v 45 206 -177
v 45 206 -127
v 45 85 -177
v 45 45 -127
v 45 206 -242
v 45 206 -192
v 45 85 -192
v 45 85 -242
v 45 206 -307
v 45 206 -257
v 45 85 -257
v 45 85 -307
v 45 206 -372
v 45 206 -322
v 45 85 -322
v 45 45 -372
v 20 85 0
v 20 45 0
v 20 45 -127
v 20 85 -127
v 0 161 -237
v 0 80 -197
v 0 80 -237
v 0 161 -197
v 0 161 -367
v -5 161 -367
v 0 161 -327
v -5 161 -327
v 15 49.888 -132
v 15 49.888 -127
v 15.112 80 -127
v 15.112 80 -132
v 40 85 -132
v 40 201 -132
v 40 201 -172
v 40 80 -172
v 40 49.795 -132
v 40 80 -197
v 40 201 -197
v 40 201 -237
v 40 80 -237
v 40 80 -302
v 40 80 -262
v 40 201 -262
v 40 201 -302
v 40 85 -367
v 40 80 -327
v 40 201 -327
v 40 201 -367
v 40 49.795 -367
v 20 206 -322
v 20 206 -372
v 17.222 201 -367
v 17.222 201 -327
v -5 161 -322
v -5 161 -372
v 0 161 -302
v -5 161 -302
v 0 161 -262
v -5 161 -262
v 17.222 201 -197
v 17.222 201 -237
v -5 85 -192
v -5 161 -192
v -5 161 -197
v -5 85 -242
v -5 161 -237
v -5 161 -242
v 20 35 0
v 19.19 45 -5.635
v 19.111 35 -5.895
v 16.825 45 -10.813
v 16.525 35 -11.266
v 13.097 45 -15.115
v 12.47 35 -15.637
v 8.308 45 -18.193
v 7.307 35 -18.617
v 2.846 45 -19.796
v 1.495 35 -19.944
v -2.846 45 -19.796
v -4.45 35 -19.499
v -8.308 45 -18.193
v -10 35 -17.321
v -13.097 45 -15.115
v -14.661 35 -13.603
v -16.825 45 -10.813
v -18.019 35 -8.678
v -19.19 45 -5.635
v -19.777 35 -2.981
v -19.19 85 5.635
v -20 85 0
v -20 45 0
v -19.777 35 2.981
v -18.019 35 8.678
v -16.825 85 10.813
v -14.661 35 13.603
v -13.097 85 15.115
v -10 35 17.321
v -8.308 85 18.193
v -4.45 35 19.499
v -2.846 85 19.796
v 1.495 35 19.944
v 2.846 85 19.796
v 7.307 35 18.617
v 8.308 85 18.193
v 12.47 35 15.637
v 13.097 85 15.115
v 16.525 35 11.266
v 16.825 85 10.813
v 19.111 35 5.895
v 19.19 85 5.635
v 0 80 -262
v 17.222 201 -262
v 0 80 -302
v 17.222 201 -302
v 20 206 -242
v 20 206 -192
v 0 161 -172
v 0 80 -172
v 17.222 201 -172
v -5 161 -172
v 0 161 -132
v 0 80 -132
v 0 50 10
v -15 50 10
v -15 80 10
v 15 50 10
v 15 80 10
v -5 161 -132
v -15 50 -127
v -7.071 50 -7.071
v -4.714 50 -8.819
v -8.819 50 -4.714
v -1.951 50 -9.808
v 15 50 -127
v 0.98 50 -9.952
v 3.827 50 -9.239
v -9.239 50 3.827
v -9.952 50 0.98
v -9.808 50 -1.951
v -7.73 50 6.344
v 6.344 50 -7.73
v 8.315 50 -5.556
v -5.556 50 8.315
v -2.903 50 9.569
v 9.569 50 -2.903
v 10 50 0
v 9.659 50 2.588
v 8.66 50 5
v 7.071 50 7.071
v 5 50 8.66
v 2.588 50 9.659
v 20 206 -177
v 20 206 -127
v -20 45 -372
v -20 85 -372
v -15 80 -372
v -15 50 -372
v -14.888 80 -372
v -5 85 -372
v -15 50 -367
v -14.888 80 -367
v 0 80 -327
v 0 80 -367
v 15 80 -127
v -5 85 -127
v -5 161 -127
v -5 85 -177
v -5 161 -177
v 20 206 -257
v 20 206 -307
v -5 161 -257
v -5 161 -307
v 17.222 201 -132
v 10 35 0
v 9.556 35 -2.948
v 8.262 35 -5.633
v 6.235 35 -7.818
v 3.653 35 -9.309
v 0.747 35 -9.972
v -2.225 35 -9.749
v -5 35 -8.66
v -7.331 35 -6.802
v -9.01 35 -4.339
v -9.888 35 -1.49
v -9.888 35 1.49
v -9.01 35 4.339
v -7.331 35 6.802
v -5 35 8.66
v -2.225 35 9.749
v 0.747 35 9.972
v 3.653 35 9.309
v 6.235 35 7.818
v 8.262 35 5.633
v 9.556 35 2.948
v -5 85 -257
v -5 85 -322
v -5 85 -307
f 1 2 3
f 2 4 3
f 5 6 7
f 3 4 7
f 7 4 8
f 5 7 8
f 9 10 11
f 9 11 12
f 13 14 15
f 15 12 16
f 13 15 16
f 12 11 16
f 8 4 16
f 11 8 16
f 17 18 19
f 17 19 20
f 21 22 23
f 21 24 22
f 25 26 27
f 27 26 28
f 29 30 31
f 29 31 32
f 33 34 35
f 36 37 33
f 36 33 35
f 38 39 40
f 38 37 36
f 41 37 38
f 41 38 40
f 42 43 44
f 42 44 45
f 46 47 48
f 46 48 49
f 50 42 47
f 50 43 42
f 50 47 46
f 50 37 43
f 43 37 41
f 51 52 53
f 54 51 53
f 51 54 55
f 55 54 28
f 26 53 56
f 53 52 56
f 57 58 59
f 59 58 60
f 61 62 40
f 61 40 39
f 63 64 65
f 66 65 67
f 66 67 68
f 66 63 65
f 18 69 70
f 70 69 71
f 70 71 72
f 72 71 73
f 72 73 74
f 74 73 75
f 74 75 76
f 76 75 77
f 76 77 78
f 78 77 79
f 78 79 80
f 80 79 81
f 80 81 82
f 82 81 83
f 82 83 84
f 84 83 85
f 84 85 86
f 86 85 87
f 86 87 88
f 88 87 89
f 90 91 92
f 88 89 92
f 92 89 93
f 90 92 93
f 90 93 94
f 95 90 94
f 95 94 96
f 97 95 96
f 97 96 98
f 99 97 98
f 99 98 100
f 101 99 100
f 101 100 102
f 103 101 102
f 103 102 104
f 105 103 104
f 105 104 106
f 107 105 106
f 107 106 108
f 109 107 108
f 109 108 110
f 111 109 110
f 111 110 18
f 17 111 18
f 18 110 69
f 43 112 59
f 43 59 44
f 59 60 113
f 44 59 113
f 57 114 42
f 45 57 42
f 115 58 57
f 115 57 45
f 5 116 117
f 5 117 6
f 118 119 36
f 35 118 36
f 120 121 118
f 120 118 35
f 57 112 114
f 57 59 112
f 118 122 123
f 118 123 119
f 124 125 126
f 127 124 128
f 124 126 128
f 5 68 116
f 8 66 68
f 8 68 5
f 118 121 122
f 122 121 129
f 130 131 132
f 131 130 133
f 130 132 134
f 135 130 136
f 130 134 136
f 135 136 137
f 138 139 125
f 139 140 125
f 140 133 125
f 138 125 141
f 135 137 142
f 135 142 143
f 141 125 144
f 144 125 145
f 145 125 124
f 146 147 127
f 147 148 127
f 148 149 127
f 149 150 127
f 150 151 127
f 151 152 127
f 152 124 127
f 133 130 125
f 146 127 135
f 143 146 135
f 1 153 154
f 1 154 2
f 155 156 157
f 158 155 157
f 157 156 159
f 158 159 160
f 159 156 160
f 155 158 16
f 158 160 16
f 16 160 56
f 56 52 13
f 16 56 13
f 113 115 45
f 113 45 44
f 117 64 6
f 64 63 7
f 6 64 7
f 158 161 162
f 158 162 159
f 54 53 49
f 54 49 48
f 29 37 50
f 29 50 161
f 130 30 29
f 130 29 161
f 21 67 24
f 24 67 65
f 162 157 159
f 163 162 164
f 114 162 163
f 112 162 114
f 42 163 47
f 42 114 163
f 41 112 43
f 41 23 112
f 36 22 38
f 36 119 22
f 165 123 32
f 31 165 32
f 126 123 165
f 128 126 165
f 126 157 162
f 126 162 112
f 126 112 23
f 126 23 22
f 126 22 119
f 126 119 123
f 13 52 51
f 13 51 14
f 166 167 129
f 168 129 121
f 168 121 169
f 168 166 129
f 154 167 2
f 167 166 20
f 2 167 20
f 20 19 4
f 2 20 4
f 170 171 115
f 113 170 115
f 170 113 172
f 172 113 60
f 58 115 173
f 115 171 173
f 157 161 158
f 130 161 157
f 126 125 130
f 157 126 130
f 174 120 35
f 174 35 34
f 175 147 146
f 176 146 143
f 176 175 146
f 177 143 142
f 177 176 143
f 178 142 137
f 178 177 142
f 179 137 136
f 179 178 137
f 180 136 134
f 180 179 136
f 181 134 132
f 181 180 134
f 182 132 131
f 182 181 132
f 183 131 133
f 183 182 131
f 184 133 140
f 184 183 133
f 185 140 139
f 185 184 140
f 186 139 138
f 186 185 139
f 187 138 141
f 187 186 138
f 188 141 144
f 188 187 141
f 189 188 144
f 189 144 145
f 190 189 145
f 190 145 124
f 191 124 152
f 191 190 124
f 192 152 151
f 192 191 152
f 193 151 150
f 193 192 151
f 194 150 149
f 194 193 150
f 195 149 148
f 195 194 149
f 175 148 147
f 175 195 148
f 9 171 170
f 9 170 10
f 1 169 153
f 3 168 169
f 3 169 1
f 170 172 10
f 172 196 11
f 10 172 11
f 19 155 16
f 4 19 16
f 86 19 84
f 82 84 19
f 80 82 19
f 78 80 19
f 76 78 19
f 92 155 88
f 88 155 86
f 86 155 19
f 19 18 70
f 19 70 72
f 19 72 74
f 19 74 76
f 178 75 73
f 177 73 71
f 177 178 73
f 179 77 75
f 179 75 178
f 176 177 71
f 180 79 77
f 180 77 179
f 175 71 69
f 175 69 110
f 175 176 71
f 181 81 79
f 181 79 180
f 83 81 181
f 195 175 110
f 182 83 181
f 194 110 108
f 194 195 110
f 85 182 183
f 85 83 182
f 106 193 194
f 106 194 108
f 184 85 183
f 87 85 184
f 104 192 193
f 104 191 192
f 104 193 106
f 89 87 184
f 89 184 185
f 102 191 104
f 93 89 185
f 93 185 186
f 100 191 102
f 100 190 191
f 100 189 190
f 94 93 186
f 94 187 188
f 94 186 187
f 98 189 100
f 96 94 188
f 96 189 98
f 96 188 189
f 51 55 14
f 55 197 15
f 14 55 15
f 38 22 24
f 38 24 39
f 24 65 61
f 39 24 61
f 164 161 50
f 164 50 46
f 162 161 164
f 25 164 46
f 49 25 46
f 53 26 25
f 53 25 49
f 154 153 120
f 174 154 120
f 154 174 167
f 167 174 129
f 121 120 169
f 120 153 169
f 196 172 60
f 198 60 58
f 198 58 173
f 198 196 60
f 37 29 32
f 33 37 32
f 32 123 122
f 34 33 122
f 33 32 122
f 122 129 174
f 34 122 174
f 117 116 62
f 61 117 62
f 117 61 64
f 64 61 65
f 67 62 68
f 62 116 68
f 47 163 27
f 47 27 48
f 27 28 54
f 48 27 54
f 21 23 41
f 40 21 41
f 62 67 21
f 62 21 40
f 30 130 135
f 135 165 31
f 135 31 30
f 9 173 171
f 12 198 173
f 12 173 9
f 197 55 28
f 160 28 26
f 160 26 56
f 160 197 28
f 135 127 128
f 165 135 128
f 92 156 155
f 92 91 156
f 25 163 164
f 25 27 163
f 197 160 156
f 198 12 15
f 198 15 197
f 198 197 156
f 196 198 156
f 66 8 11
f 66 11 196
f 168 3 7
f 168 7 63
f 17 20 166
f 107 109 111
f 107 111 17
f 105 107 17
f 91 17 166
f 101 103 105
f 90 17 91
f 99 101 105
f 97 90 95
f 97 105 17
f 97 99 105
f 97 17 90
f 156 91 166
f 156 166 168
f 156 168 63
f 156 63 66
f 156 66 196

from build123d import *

# Parameters (mm, degrees)
SKETCH2_R               = 20
SKETCH2_R_2             = 10
BOSS_EXTRUDE1_DEPTH     = 80
SKETCH3_R               = 20
BOSS_EXTRUDE2_DEPTH     = 5
SKETCH4_W               = 30
SKETCH4_H               = 30
CUT_EXTRUDE1_DEPTH      = 50
SKETCH4_4_W             = 40
SKETCH4_4_H             = 40
SKETCH4_4_W_2           = 30
SKETCH4_4_H_2           = 30
BOSS_EXTRUDE3_DEPTH     = 127
SKETCH4_5_W             = 30
SKETCH4_5_H             = 30
CUT_EXTRUDE2_DEPTH      = 10
SKETCH5_R               = 10
CUT_EXTRUDE3_DEPTH      = 50
BOSS_EXTRUDE4_DEPTH     = 245
SKETCH7_W               = 25
SKETCH7_H               = 5
SKETCH7_W_2             = 55.000380238
BOSS_EXTRUDE5_DEPTH     = 35
SKETCH11_W              = 65
SKETCH11_H              = 5
BOSS_EXTRUDE9_DEPTH     = 245
SKETCH9_W               = 40
SKETCH9_H               = 40
CUT_EXTRUDE4_DEPTH      = 10
SKETCH9_4_W             = 50
SKETCH9_4_H             = 50
SKETCH9_4_W_2           = 40
SKETCH9_4_H_2           = 40
BOSS_EXTRUDE10_DEPTH    = 116
SKETCH13_W              = 50
SKETCH13_H              = 50
BOSS_EXTRUDE11_DEPTH    = 5
SKETCH14_W              = 40
SKETCH14_H              = 40
CUT_EXTRUDE5_DEPTH      = 5
CUT_EXTRUDE6_DEPTH      = 393
SKETCH16_W              = 40
SKETCH16_H              = 35
CUT_EXTRUDE7_DEPTH      = 1
CUT_EXTRUDE7_DEPTH_BACK = 66


with BuildPart() as part:
    # Sketch2 → Boss-Extrude1 (new body)
    with BuildSketch(Plane(origin=(0, 0, 0), x_dir=(1, 0, 0), z_dir=(0, 1, 0))):
        Circle(SKETCH2_R)
        Circle(SKETCH2_R_2, mode=Mode.SUBTRACT)
    extrude(amount=BOSS_EXTRUDE1_DEPTH)

    # Sketch3 → Boss-Extrude2 (add)
    with BuildSketch(Plane(origin=(0, 80, 0), x_dir=(1, 0, 0), z_dir=(0, 1, 0))):
        Circle(SKETCH3_R)
    extrude(amount=BOSS_EXTRUDE2_DEPTH)

    # Sketch4 → Cut-Extrude1 (cut)
    with BuildSketch(Plane.XY):
        with Locations((0, 65)):
            Rectangle(SKETCH4_W, SKETCH4_H)
    extrude(amount=-CUT_EXTRUDE1_DEPTH, mode=Mode.SUBTRACT)

    # Sketch4<4> → Boss-Extrude3 (add)
    with BuildSketch(Plane.XY):
        with Locations((0, 65)):
            Rectangle(SKETCH4_4_W, SKETCH4_4_H)
        with Locations((0, 65)):
            Rectangle(SKETCH4_4_W_2, SKETCH4_4_H_2, mode=Mode.SUBTRACT)
    extrude(amount=-BOSS_EXTRUDE3_DEPTH)

    # Sketch4<5> → Cut-Extrude2 (cut)
    with BuildSketch(Plane.XY):
        with Locations((0, 65)):
            Rectangle(SKETCH4_5_W, SKETCH4_5_H)
    extrude(amount=CUT_EXTRUDE2_DEPTH, mode=Mode.SUBTRACT)

    # Sketch5 → Cut-Extrude3 (cut)
    with BuildSketch(Plane.XZ):
        Circle(SKETCH5_R)
    extrude(amount=-CUT_EXTRUDE3_DEPTH, mode=Mode.SUBTRACT)

    # Sketch6 → Boss-Extrude4 (add)
    with BuildSketch(Plane(origin=(0, 0, -127), x_dir=(-1, 0, 0), z_dir=(0, 0, -1))):
        Polygon((0, 80), (0, 85), (20, 85), (20, 45), (-45, 45), (-45, 85), (-40, 85), (-40, 49.795485049), (15, 50), (15, 80), align=None)
    extrude(amount=BOSS_EXTRUDE4_DEPTH)

    # Sketch7 → Boss-Extrude5 (add)
    with BuildSketch(Plane(origin=(0.185712712, 49.943532631, 0), x_dir=(0.999993087, -0.003718428, 0), z_dir=(0.003718428, 0.999993087, 0))):
        with Locations((27.314562541, 129.5)):
            Rectangle(SKETCH7_W, SKETCH7_H)
        with Locations((12.314372422, 369.5)):
            Rectangle(SKETCH7_W_2, SKETCH7_H)
    extrude(amount=BOSS_EXTRUDE5_DEPTH)

    # Sketch11 → Boss-Extrude9 (add)
    with BuildSketch(Plane(origin=(0, 0, -372), x_dir=(-1, 0, 0), z_dir=(0, 0, -1))):
        with Locations((-12.5, 82.5)):
            Rectangle(SKETCH11_W, SKETCH11_H)
    extrude(amount=-BOSS_EXTRUDE9_DEPTH)

    # Sketch9 → Cut-Extrude4 (cut)
    with BuildSketch(Plane(origin=(0, 85, 0), x_dir=(1, 0, 0), z_dir=(0, 1, 0))):
        with Locations((20, 152)):
            Rectangle(SKETCH9_W, SKETCH9_H)
        with Locations((20, 217)):
            Rectangle(SKETCH9_W, SKETCH9_H)
        with Locations((20, 282)):
            Rectangle(SKETCH9_W, SKETCH9_H)
        with Locations((20, 347)):
            Rectangle(SKETCH9_W, SKETCH9_H)
    extrude(amount=-CUT_EXTRUDE4_DEPTH, mode=Mode.SUBTRACT)

    # Sketch9<4> → Boss-Extrude10 (add)
    with BuildSketch(Plane(origin=(0, 85, 0), x_dir=(1, 0, 0), z_dir=(0, 1, 0))):
        with Locations((20, 152)):
            Rectangle(SKETCH9_4_W, SKETCH9_4_H)
        with Locations((20, 152)):
            Rectangle(SKETCH9_4_W_2, SKETCH9_4_H_2, mode=Mode.SUBTRACT)
        with Locations((20, 217)):
            Rectangle(SKETCH9_4_W, SKETCH9_4_H)
        with Locations((20, 217)):
            Rectangle(SKETCH9_4_W_2, SKETCH9_4_H_2, mode=Mode.SUBTRACT)
        with Locations((20, 282)):
            Rectangle(SKETCH9_4_W, SKETCH9_4_H)
        with Locations((20, 282)):
            Rectangle(SKETCH9_4_W_2, SKETCH9_4_H_2, mode=Mode.SUBTRACT)
        with Locations((20, 347)):
            Rectangle(SKETCH9_4_W, SKETCH9_4_H)
        with Locations((20, 347)):
            Rectangle(SKETCH9_4_W_2, SKETCH9_4_H_2, mode=Mode.SUBTRACT)
    extrude(amount=BOSS_EXTRUDE10_DEPTH)

    # Sketch13 → Boss-Extrude11 (add)
    with BuildSketch(Plane(origin=(0, 201, 0), x_dir=(1, 0, 0), z_dir=(0, 1, 0))):
        with Locations((20, 152)):
            Rectangle(SKETCH13_W, SKETCH13_H)
        with Locations((20, 217)):
            Rectangle(SKETCH13_W, SKETCH13_H)
        with Locations((20, 282)):
            Rectangle(SKETCH13_W, SKETCH13_H)
        with Locations((20, 347)):
            Rectangle(SKETCH13_W, SKETCH13_H)
    extrude(amount=BOSS_EXTRUDE11_DEPTH)

    # Sketch14 → Cut-Extrude5 (cut)
    with BuildSketch(Plane.ZY.offset(5)):
        with Locations((-347, 181)):
            Rectangle(SKETCH14_W, SKETCH14_H)
        with Locations((-282, 181)):
            Rectangle(SKETCH14_W, SKETCH14_H)
        with Locations((-217, 181)):
            Rectangle(SKETCH14_W, SKETCH14_H)
        with Locations((-152, 181)):
            Rectangle(SKETCH14_W, SKETCH14_H)
    extrude(amount=-CUT_EXTRUDE5_DEPTH, mode=Mode.SUBTRACT)

    # Sketch15 → Cut-Extrude6 (cut, through all)
    with BuildSketch(Plane(origin=(0, 0, -372), x_dir=(-1, 0, 0), z_dir=(0, 0, -1))):
        Polygon((-20, 206), (5, 161), (5, 206), align=None)
    extrude(amount=-CUT_EXTRUDE6_DEPTH, mode=Mode.SUBTRACT)

    # Sketch16 → Cut-Extrude7 (cut, two sides)
    with BuildSketch(Plane.ZY.offset(20)) as cut_extrude7_sk:
        with Locations((0, 17.5)):
            Rectangle(SKETCH16_W, SKETCH16_H)
    extrude(amount=CUT_EXTRUDE7_DEPTH, mode=Mode.SUBTRACT)
    extrude(cut_extrude7_sk.sketch, amount=-CUT_EXTRUDE7_DEPTH_BACK, mode=Mode.SUBTRACT)


solid = part.part
